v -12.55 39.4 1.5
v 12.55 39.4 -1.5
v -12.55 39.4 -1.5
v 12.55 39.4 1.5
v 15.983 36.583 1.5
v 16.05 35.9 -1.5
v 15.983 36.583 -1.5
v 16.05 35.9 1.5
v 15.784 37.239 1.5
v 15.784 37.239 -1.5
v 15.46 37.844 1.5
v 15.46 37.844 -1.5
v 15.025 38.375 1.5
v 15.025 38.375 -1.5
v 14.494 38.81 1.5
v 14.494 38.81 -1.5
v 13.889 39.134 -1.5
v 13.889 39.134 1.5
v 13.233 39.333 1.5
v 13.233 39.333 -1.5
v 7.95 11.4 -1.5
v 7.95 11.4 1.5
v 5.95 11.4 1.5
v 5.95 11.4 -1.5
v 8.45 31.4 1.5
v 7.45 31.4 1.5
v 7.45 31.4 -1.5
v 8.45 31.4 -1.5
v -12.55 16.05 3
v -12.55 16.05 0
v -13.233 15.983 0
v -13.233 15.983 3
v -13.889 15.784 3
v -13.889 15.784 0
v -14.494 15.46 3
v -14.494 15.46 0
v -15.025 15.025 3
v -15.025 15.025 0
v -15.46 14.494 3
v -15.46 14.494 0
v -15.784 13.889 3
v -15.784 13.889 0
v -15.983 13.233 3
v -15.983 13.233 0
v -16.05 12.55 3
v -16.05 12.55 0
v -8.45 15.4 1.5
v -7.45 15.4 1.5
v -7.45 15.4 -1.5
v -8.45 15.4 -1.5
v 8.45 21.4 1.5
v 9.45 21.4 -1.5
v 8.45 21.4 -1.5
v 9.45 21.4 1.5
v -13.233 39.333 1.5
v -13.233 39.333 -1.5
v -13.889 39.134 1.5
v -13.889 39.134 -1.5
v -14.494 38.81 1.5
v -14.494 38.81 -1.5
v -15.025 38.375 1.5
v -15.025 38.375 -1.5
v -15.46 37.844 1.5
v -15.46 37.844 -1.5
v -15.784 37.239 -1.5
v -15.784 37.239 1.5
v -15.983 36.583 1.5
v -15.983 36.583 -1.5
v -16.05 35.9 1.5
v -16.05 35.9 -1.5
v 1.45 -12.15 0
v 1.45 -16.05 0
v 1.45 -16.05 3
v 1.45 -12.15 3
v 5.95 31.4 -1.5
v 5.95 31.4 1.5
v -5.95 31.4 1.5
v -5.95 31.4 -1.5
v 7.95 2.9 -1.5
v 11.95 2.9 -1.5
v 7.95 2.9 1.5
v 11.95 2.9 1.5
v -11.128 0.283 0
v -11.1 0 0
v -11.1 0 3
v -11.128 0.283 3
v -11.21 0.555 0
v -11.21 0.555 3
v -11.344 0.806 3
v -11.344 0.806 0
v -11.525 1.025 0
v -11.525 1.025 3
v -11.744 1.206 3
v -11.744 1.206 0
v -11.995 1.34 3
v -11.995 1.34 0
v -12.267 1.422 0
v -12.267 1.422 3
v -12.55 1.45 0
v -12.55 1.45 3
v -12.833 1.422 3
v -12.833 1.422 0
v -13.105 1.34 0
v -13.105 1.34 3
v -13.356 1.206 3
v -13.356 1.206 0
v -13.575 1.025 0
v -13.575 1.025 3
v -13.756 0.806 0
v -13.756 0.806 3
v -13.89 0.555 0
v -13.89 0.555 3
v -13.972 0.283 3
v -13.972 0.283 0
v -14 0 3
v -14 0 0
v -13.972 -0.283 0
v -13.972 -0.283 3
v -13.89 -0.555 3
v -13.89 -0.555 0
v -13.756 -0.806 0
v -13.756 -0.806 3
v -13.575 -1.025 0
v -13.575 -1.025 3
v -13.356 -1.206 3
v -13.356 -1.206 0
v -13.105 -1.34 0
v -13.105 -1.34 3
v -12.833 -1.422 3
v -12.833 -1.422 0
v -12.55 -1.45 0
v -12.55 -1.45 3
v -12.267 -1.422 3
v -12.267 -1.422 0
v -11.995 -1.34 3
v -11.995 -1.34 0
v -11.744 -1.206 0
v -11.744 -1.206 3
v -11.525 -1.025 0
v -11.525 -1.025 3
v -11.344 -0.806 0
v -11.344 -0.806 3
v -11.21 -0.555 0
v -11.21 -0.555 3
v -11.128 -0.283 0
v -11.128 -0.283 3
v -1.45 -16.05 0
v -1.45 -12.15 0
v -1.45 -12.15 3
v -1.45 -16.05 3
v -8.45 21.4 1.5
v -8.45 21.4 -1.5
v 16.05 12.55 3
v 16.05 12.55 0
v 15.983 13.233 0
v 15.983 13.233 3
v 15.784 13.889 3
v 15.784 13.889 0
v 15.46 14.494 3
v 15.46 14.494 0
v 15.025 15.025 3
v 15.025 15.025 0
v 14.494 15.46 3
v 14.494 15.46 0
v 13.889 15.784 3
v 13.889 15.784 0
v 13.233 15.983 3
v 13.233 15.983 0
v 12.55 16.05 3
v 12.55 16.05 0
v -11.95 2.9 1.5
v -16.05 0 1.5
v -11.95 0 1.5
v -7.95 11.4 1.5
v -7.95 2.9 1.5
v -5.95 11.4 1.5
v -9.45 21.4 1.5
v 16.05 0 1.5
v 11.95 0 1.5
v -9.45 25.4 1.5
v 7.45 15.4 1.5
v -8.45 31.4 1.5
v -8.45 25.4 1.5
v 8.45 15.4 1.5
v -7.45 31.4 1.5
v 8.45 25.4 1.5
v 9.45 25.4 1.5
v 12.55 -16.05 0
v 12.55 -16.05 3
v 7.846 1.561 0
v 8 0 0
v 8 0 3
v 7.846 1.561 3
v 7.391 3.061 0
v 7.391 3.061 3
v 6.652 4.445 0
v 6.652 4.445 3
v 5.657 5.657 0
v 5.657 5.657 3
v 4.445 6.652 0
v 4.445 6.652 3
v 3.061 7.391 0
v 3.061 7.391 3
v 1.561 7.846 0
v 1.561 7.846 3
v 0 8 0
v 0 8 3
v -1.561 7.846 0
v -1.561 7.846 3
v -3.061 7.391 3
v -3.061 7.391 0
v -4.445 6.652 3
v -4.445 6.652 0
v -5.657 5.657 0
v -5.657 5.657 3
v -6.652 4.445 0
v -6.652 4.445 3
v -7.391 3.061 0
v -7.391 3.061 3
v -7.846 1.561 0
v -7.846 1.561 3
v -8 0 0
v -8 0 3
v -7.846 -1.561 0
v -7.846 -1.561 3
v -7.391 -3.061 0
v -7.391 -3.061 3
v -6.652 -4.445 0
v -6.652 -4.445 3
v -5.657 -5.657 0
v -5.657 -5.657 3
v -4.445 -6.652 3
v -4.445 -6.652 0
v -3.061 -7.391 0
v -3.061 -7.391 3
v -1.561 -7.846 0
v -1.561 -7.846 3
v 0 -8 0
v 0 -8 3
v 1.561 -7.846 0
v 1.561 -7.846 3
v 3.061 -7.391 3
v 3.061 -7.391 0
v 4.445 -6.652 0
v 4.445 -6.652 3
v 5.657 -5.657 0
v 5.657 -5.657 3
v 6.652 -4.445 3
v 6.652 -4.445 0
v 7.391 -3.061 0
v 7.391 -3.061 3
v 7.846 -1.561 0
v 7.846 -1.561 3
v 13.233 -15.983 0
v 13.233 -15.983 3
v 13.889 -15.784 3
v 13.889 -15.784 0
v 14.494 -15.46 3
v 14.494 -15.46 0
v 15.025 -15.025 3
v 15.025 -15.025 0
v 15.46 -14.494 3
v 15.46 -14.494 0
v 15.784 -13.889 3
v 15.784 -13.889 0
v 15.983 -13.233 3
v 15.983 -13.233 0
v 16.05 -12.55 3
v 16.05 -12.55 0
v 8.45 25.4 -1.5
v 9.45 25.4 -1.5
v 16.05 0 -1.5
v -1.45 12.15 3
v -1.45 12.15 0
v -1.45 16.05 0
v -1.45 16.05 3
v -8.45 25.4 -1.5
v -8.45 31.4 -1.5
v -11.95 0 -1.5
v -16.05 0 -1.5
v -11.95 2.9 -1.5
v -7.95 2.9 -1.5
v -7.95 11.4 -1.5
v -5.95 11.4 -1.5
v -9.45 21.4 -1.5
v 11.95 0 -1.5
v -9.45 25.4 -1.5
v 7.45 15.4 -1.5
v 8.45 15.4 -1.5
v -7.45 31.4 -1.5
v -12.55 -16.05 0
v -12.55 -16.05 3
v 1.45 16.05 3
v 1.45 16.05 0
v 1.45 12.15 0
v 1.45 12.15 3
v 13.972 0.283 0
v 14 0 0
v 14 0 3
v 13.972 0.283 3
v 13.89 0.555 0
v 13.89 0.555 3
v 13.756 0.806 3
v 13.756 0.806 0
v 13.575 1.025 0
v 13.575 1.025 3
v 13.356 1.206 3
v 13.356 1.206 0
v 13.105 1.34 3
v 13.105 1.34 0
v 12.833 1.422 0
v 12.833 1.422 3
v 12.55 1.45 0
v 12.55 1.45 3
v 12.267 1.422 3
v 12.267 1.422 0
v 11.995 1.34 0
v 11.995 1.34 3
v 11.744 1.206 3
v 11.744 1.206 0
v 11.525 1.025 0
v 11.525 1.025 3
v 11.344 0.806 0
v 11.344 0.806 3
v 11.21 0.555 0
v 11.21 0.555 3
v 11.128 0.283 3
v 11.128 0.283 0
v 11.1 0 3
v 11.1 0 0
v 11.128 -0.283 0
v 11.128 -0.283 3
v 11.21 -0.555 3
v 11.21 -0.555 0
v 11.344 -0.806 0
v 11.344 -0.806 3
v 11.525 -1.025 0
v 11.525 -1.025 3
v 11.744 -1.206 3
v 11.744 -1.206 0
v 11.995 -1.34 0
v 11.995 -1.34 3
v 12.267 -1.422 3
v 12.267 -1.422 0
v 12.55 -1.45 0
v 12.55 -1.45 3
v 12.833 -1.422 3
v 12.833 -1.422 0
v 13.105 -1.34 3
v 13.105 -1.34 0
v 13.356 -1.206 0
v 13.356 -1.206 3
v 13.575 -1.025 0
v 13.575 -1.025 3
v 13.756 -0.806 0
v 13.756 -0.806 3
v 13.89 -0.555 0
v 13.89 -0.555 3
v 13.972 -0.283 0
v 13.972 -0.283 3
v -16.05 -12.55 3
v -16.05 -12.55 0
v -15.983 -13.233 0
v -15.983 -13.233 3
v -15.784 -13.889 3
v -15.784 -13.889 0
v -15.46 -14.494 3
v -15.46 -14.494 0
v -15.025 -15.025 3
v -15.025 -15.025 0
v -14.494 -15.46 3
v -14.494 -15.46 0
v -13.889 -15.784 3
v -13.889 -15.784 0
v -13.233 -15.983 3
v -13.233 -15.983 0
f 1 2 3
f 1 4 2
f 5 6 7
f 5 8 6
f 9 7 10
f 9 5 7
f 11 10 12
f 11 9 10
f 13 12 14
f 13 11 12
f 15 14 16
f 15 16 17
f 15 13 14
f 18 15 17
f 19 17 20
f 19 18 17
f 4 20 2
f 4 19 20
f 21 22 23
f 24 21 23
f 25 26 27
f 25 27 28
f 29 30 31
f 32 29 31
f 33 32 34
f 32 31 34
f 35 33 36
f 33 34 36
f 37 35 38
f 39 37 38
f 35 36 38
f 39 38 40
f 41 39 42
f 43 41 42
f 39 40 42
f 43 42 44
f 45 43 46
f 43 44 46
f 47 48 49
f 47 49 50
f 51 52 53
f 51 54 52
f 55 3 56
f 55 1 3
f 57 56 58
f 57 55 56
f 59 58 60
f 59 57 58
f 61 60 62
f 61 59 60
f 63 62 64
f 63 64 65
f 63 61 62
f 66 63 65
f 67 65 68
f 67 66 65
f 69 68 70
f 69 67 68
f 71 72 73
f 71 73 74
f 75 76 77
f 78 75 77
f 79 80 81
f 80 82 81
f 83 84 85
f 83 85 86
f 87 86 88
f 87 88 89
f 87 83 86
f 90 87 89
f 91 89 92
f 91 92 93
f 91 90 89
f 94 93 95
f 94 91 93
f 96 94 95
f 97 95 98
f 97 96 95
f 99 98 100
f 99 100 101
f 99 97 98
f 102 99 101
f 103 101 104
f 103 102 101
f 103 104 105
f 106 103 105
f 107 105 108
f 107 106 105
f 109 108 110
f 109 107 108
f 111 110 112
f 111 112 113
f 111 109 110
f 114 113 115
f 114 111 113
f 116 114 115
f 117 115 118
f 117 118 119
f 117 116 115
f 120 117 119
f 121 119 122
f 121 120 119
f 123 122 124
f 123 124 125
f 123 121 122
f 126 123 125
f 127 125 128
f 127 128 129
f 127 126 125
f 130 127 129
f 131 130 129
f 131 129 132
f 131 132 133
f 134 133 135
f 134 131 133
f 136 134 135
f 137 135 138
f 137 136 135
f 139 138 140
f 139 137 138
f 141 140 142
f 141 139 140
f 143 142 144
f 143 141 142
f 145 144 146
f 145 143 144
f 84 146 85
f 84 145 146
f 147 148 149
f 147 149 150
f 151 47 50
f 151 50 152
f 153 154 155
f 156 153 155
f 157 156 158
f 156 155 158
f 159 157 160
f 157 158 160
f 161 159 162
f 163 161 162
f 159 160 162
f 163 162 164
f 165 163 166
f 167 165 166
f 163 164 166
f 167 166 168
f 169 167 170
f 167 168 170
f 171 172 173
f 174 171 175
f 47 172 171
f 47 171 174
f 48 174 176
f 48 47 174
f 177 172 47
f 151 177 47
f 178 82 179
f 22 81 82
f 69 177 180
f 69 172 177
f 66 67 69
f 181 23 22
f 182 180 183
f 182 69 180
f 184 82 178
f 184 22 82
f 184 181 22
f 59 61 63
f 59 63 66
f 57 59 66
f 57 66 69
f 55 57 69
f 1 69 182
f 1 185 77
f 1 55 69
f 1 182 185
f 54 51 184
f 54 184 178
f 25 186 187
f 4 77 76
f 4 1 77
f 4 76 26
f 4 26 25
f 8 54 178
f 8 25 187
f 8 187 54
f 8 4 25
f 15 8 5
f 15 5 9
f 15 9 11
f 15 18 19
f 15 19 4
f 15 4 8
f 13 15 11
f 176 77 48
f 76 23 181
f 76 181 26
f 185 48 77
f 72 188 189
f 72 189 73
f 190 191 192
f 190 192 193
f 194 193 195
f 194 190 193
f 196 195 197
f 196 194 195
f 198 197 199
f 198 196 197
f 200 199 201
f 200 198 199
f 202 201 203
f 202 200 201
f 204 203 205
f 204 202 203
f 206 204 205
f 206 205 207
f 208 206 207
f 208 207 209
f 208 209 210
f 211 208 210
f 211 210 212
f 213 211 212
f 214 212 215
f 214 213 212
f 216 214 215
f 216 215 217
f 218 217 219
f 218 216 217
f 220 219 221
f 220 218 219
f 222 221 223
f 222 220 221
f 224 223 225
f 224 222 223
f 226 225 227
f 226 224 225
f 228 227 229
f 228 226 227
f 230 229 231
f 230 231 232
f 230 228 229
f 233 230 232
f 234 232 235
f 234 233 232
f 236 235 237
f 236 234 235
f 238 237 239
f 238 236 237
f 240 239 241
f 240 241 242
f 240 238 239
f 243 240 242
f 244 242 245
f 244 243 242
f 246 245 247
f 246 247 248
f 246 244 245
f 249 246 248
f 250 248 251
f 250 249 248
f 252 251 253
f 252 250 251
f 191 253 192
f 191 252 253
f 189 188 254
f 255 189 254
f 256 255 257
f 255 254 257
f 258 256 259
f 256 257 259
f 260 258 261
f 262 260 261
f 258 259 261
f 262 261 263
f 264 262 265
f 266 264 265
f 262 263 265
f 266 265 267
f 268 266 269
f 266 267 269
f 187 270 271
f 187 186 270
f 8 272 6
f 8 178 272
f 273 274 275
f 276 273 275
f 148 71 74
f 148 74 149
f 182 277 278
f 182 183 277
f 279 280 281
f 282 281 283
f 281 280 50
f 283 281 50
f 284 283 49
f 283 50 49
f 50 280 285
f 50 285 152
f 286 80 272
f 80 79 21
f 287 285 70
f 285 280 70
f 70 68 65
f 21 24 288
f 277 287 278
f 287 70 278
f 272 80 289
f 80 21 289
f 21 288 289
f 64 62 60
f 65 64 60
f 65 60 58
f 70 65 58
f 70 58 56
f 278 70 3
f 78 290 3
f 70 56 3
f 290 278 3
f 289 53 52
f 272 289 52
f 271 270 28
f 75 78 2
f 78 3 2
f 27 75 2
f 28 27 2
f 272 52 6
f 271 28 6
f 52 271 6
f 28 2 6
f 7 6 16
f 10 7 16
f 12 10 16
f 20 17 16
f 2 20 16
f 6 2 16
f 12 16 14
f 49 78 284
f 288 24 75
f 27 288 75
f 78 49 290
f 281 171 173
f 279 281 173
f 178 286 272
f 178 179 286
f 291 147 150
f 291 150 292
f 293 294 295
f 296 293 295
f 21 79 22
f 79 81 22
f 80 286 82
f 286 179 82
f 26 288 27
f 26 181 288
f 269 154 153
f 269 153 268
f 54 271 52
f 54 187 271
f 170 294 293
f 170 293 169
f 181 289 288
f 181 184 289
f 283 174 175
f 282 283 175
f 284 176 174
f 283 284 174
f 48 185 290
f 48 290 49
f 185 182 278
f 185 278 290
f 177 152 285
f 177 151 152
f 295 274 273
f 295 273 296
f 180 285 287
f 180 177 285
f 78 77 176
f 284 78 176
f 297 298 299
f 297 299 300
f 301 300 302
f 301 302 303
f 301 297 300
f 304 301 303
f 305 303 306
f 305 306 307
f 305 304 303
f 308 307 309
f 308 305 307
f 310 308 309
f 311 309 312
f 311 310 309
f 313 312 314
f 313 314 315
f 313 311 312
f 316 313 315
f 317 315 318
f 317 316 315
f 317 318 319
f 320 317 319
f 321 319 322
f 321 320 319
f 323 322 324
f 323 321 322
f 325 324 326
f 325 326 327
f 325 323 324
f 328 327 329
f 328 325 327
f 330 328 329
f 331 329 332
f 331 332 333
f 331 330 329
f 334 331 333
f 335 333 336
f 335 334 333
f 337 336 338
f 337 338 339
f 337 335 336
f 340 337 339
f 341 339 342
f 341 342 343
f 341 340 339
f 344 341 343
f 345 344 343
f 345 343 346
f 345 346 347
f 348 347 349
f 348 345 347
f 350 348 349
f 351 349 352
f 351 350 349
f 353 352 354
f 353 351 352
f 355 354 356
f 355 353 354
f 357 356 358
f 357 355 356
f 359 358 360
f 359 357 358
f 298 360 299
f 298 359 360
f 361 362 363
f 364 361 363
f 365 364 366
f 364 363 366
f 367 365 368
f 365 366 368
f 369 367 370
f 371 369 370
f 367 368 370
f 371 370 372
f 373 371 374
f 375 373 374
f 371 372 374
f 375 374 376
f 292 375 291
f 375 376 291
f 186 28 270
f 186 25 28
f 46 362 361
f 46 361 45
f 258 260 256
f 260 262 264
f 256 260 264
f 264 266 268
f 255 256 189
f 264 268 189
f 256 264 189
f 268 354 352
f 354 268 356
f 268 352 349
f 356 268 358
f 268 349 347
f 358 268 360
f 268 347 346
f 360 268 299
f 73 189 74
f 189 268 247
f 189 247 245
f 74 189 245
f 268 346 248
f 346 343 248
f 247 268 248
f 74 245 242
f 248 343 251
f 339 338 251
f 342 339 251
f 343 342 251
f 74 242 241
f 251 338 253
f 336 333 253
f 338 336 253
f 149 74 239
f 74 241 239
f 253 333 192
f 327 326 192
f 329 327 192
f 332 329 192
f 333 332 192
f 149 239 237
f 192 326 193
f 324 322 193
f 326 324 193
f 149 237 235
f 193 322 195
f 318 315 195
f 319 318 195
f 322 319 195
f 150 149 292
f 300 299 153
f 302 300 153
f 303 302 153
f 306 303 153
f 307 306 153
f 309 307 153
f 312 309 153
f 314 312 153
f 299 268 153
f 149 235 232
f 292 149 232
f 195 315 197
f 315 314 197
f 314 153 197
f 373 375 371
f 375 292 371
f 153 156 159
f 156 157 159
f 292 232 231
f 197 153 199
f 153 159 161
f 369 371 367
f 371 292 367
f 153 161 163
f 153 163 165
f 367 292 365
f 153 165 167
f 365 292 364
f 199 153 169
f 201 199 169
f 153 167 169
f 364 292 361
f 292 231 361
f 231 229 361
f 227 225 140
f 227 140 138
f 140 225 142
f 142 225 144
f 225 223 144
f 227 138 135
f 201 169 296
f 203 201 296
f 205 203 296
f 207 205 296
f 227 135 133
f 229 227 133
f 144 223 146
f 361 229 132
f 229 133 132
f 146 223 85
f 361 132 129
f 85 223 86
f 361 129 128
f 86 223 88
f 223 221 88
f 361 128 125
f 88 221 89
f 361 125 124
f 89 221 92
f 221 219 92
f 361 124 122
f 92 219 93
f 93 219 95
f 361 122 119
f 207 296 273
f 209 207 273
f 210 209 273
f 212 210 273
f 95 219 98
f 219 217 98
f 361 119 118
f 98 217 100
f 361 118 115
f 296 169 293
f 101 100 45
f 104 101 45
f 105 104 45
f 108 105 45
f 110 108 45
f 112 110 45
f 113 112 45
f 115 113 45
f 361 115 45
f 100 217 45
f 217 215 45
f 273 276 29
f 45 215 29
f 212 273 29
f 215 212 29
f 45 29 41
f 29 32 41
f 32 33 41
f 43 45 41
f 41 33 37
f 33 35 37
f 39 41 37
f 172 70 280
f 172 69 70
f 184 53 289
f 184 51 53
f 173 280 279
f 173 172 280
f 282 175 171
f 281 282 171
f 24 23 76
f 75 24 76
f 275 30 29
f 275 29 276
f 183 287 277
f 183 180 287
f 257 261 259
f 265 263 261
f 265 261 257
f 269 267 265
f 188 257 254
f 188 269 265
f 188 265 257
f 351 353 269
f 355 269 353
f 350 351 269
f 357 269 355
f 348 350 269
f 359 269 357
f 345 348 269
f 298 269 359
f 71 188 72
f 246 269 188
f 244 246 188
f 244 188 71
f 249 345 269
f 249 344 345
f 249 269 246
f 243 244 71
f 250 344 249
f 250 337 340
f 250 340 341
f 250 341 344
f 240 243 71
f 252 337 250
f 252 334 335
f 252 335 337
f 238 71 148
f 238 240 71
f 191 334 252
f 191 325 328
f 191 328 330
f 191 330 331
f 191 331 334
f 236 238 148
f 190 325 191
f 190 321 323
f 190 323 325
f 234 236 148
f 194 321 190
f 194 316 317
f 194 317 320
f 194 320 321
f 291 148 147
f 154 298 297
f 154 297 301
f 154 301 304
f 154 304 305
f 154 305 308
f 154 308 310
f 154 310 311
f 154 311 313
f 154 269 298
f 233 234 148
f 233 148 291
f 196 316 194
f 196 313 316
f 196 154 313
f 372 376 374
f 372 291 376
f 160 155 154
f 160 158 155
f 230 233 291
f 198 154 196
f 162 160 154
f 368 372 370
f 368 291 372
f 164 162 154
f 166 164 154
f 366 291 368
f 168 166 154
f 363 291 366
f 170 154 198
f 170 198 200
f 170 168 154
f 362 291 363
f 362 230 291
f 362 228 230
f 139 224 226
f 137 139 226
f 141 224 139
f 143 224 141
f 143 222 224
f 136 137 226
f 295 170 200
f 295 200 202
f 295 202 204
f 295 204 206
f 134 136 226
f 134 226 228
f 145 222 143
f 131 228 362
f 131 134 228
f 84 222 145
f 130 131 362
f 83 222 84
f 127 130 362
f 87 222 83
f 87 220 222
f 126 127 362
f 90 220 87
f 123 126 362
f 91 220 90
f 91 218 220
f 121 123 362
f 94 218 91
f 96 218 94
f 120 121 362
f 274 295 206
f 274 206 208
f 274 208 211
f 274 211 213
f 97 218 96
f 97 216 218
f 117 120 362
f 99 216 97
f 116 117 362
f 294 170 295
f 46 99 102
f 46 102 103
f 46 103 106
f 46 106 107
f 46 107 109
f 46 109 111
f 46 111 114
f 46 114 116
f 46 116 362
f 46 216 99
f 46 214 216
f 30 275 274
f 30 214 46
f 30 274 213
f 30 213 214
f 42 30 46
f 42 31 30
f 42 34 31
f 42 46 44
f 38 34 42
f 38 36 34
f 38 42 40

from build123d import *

# Parameters (mm, degrees)
SKETCH_R          = 8
SKETCH_R_2        = 1.45
PAD_DEPTH         = 3
PAD001_DEPTH      = 1.5
PAD001_DEPTH_BACK = 1.5


with BuildPart() as body:
    # Sketch → Pad (new body)
    with BuildSketch(Plane.XY):
        with BuildLine():
            Line((-12.55, 16.05), (-1.45, 16.05))
            Line((-1.45, 12.15), (-1.45, 16.05))
            Line((-1.45, 12.15), (1.45, 12.15))
            Line((1.45, 16.05), (1.45, 12.15))
            Line((1.45, 16.05), (12.55, 16.05))
            ThreePointArc((16.05, 12.55), (15.024874, 15.024874), (12.55, 16.05))
            Line((16.05, 12.55), (16.05, -12.55))
            ThreePointArc((12.55, -16.05), (15.024874, -15.024874), (16.05, -12.55))
            Line((12.55, -16.05), (1.45, -16.05))
            Line((1.45, -16.05), (1.45, -12.15))
            Line((1.45, -12.15), (-1.45, -12.15))
            Line((-1.45, -12.15), (-1.45, -16.05))
            Line((-1.45, -16.05), (-12.55, -16.05))
            ThreePointArc((-16.05, -12.55), (-15.024874, -15.024874), (-12.55, -16.05))
            Line((-16.05, -12.55), (-16.05, 12.55))
            ThreePointArc((-12.55, 16.05), (-15.024874, 15.024874), (-16.05, 12.55))
        make_face()
        Circle(SKETCH_R, mode=Mode.SUBTRACT)
        with Locations((-12.55, 0)):
            Circle(SKETCH_R_2, mode=Mode.SUBTRACT)
        with Locations((12.55, 0)):
            Circle(SKETCH_R_2, mode=Mode.SUBTRACT)
    extrude(amount=PAD_DEPTH)


with BuildPart() as body002:
    # Sketch002 → Pad001 (new body, two sides)
    with BuildSketch(Plane.XY) as pad001_sk:
        with BuildLine():
            Line((-16.05, 0), (-11.95, 0))
            Line((-11.95, 2.9), (-11.95, 0))
            Line((-7.95, 2.9), (-11.95, 2.9))
            Line((-7.95, 11.4), (-7.95, 2.9))
            Line((-5.95, 11.4), (-7.95, 11.4))
            Line((-5.95, 31.4), (-5.95, 11.4))
            Line((5.95, 31.4), (-5.95, 31.4))
            Line((5.95, 11.4), (5.95, 31.4))
            Line((7.95, 11.4), (5.95, 11.4))
            Line((7.95, 2.9), (7.95, 11.4))
            Line((11.95, 2.9), (7.95, 2.9))
            Line((11.95, 0), (11.95, 2.9))
            Line((11.95, 0), (16.05, 0))
            Line((16.05, 0), (16.05, 35.9))
            ThreePointArc((16.05, 35.9), (15.024874, 38.374874), (12.55, 39.4))
            Line((12.55, 39.4), (-12.55, 39.4))
            ThreePointArc((-12.55, 39.4), (-15.024874, 38.374874), (-16.05, 35.9))
            Line((-16.05, 35.9), (-16.05, 0))
        make_face()
        Polygon((-8.45, 31.4), (-7.45, 31.4), (-7.45, 15.4), (-8.45, 15.4), (-8.45, 21.4), (-9.45, 21.4), (-9.45, 25.4), (-8.45, 25.4), align=None, mode=Mode.SUBTRACT)
        Polygon((7.45, 31.4), (8.45, 31.4), (8.45, 25.4), (9.45, 25.4), (9.45, 21.4), (8.45, 21.4), (8.45, 15.4), (7.45, 15.4), align=None, mode=Mode.SUBTRACT)
    extrude(amount=PAD001_DEPTH)
    extrude(pad001_sk.sketch, amount=-PAD001_DEPTH_BACK)


solid = Compound([body.part, body002.part])
